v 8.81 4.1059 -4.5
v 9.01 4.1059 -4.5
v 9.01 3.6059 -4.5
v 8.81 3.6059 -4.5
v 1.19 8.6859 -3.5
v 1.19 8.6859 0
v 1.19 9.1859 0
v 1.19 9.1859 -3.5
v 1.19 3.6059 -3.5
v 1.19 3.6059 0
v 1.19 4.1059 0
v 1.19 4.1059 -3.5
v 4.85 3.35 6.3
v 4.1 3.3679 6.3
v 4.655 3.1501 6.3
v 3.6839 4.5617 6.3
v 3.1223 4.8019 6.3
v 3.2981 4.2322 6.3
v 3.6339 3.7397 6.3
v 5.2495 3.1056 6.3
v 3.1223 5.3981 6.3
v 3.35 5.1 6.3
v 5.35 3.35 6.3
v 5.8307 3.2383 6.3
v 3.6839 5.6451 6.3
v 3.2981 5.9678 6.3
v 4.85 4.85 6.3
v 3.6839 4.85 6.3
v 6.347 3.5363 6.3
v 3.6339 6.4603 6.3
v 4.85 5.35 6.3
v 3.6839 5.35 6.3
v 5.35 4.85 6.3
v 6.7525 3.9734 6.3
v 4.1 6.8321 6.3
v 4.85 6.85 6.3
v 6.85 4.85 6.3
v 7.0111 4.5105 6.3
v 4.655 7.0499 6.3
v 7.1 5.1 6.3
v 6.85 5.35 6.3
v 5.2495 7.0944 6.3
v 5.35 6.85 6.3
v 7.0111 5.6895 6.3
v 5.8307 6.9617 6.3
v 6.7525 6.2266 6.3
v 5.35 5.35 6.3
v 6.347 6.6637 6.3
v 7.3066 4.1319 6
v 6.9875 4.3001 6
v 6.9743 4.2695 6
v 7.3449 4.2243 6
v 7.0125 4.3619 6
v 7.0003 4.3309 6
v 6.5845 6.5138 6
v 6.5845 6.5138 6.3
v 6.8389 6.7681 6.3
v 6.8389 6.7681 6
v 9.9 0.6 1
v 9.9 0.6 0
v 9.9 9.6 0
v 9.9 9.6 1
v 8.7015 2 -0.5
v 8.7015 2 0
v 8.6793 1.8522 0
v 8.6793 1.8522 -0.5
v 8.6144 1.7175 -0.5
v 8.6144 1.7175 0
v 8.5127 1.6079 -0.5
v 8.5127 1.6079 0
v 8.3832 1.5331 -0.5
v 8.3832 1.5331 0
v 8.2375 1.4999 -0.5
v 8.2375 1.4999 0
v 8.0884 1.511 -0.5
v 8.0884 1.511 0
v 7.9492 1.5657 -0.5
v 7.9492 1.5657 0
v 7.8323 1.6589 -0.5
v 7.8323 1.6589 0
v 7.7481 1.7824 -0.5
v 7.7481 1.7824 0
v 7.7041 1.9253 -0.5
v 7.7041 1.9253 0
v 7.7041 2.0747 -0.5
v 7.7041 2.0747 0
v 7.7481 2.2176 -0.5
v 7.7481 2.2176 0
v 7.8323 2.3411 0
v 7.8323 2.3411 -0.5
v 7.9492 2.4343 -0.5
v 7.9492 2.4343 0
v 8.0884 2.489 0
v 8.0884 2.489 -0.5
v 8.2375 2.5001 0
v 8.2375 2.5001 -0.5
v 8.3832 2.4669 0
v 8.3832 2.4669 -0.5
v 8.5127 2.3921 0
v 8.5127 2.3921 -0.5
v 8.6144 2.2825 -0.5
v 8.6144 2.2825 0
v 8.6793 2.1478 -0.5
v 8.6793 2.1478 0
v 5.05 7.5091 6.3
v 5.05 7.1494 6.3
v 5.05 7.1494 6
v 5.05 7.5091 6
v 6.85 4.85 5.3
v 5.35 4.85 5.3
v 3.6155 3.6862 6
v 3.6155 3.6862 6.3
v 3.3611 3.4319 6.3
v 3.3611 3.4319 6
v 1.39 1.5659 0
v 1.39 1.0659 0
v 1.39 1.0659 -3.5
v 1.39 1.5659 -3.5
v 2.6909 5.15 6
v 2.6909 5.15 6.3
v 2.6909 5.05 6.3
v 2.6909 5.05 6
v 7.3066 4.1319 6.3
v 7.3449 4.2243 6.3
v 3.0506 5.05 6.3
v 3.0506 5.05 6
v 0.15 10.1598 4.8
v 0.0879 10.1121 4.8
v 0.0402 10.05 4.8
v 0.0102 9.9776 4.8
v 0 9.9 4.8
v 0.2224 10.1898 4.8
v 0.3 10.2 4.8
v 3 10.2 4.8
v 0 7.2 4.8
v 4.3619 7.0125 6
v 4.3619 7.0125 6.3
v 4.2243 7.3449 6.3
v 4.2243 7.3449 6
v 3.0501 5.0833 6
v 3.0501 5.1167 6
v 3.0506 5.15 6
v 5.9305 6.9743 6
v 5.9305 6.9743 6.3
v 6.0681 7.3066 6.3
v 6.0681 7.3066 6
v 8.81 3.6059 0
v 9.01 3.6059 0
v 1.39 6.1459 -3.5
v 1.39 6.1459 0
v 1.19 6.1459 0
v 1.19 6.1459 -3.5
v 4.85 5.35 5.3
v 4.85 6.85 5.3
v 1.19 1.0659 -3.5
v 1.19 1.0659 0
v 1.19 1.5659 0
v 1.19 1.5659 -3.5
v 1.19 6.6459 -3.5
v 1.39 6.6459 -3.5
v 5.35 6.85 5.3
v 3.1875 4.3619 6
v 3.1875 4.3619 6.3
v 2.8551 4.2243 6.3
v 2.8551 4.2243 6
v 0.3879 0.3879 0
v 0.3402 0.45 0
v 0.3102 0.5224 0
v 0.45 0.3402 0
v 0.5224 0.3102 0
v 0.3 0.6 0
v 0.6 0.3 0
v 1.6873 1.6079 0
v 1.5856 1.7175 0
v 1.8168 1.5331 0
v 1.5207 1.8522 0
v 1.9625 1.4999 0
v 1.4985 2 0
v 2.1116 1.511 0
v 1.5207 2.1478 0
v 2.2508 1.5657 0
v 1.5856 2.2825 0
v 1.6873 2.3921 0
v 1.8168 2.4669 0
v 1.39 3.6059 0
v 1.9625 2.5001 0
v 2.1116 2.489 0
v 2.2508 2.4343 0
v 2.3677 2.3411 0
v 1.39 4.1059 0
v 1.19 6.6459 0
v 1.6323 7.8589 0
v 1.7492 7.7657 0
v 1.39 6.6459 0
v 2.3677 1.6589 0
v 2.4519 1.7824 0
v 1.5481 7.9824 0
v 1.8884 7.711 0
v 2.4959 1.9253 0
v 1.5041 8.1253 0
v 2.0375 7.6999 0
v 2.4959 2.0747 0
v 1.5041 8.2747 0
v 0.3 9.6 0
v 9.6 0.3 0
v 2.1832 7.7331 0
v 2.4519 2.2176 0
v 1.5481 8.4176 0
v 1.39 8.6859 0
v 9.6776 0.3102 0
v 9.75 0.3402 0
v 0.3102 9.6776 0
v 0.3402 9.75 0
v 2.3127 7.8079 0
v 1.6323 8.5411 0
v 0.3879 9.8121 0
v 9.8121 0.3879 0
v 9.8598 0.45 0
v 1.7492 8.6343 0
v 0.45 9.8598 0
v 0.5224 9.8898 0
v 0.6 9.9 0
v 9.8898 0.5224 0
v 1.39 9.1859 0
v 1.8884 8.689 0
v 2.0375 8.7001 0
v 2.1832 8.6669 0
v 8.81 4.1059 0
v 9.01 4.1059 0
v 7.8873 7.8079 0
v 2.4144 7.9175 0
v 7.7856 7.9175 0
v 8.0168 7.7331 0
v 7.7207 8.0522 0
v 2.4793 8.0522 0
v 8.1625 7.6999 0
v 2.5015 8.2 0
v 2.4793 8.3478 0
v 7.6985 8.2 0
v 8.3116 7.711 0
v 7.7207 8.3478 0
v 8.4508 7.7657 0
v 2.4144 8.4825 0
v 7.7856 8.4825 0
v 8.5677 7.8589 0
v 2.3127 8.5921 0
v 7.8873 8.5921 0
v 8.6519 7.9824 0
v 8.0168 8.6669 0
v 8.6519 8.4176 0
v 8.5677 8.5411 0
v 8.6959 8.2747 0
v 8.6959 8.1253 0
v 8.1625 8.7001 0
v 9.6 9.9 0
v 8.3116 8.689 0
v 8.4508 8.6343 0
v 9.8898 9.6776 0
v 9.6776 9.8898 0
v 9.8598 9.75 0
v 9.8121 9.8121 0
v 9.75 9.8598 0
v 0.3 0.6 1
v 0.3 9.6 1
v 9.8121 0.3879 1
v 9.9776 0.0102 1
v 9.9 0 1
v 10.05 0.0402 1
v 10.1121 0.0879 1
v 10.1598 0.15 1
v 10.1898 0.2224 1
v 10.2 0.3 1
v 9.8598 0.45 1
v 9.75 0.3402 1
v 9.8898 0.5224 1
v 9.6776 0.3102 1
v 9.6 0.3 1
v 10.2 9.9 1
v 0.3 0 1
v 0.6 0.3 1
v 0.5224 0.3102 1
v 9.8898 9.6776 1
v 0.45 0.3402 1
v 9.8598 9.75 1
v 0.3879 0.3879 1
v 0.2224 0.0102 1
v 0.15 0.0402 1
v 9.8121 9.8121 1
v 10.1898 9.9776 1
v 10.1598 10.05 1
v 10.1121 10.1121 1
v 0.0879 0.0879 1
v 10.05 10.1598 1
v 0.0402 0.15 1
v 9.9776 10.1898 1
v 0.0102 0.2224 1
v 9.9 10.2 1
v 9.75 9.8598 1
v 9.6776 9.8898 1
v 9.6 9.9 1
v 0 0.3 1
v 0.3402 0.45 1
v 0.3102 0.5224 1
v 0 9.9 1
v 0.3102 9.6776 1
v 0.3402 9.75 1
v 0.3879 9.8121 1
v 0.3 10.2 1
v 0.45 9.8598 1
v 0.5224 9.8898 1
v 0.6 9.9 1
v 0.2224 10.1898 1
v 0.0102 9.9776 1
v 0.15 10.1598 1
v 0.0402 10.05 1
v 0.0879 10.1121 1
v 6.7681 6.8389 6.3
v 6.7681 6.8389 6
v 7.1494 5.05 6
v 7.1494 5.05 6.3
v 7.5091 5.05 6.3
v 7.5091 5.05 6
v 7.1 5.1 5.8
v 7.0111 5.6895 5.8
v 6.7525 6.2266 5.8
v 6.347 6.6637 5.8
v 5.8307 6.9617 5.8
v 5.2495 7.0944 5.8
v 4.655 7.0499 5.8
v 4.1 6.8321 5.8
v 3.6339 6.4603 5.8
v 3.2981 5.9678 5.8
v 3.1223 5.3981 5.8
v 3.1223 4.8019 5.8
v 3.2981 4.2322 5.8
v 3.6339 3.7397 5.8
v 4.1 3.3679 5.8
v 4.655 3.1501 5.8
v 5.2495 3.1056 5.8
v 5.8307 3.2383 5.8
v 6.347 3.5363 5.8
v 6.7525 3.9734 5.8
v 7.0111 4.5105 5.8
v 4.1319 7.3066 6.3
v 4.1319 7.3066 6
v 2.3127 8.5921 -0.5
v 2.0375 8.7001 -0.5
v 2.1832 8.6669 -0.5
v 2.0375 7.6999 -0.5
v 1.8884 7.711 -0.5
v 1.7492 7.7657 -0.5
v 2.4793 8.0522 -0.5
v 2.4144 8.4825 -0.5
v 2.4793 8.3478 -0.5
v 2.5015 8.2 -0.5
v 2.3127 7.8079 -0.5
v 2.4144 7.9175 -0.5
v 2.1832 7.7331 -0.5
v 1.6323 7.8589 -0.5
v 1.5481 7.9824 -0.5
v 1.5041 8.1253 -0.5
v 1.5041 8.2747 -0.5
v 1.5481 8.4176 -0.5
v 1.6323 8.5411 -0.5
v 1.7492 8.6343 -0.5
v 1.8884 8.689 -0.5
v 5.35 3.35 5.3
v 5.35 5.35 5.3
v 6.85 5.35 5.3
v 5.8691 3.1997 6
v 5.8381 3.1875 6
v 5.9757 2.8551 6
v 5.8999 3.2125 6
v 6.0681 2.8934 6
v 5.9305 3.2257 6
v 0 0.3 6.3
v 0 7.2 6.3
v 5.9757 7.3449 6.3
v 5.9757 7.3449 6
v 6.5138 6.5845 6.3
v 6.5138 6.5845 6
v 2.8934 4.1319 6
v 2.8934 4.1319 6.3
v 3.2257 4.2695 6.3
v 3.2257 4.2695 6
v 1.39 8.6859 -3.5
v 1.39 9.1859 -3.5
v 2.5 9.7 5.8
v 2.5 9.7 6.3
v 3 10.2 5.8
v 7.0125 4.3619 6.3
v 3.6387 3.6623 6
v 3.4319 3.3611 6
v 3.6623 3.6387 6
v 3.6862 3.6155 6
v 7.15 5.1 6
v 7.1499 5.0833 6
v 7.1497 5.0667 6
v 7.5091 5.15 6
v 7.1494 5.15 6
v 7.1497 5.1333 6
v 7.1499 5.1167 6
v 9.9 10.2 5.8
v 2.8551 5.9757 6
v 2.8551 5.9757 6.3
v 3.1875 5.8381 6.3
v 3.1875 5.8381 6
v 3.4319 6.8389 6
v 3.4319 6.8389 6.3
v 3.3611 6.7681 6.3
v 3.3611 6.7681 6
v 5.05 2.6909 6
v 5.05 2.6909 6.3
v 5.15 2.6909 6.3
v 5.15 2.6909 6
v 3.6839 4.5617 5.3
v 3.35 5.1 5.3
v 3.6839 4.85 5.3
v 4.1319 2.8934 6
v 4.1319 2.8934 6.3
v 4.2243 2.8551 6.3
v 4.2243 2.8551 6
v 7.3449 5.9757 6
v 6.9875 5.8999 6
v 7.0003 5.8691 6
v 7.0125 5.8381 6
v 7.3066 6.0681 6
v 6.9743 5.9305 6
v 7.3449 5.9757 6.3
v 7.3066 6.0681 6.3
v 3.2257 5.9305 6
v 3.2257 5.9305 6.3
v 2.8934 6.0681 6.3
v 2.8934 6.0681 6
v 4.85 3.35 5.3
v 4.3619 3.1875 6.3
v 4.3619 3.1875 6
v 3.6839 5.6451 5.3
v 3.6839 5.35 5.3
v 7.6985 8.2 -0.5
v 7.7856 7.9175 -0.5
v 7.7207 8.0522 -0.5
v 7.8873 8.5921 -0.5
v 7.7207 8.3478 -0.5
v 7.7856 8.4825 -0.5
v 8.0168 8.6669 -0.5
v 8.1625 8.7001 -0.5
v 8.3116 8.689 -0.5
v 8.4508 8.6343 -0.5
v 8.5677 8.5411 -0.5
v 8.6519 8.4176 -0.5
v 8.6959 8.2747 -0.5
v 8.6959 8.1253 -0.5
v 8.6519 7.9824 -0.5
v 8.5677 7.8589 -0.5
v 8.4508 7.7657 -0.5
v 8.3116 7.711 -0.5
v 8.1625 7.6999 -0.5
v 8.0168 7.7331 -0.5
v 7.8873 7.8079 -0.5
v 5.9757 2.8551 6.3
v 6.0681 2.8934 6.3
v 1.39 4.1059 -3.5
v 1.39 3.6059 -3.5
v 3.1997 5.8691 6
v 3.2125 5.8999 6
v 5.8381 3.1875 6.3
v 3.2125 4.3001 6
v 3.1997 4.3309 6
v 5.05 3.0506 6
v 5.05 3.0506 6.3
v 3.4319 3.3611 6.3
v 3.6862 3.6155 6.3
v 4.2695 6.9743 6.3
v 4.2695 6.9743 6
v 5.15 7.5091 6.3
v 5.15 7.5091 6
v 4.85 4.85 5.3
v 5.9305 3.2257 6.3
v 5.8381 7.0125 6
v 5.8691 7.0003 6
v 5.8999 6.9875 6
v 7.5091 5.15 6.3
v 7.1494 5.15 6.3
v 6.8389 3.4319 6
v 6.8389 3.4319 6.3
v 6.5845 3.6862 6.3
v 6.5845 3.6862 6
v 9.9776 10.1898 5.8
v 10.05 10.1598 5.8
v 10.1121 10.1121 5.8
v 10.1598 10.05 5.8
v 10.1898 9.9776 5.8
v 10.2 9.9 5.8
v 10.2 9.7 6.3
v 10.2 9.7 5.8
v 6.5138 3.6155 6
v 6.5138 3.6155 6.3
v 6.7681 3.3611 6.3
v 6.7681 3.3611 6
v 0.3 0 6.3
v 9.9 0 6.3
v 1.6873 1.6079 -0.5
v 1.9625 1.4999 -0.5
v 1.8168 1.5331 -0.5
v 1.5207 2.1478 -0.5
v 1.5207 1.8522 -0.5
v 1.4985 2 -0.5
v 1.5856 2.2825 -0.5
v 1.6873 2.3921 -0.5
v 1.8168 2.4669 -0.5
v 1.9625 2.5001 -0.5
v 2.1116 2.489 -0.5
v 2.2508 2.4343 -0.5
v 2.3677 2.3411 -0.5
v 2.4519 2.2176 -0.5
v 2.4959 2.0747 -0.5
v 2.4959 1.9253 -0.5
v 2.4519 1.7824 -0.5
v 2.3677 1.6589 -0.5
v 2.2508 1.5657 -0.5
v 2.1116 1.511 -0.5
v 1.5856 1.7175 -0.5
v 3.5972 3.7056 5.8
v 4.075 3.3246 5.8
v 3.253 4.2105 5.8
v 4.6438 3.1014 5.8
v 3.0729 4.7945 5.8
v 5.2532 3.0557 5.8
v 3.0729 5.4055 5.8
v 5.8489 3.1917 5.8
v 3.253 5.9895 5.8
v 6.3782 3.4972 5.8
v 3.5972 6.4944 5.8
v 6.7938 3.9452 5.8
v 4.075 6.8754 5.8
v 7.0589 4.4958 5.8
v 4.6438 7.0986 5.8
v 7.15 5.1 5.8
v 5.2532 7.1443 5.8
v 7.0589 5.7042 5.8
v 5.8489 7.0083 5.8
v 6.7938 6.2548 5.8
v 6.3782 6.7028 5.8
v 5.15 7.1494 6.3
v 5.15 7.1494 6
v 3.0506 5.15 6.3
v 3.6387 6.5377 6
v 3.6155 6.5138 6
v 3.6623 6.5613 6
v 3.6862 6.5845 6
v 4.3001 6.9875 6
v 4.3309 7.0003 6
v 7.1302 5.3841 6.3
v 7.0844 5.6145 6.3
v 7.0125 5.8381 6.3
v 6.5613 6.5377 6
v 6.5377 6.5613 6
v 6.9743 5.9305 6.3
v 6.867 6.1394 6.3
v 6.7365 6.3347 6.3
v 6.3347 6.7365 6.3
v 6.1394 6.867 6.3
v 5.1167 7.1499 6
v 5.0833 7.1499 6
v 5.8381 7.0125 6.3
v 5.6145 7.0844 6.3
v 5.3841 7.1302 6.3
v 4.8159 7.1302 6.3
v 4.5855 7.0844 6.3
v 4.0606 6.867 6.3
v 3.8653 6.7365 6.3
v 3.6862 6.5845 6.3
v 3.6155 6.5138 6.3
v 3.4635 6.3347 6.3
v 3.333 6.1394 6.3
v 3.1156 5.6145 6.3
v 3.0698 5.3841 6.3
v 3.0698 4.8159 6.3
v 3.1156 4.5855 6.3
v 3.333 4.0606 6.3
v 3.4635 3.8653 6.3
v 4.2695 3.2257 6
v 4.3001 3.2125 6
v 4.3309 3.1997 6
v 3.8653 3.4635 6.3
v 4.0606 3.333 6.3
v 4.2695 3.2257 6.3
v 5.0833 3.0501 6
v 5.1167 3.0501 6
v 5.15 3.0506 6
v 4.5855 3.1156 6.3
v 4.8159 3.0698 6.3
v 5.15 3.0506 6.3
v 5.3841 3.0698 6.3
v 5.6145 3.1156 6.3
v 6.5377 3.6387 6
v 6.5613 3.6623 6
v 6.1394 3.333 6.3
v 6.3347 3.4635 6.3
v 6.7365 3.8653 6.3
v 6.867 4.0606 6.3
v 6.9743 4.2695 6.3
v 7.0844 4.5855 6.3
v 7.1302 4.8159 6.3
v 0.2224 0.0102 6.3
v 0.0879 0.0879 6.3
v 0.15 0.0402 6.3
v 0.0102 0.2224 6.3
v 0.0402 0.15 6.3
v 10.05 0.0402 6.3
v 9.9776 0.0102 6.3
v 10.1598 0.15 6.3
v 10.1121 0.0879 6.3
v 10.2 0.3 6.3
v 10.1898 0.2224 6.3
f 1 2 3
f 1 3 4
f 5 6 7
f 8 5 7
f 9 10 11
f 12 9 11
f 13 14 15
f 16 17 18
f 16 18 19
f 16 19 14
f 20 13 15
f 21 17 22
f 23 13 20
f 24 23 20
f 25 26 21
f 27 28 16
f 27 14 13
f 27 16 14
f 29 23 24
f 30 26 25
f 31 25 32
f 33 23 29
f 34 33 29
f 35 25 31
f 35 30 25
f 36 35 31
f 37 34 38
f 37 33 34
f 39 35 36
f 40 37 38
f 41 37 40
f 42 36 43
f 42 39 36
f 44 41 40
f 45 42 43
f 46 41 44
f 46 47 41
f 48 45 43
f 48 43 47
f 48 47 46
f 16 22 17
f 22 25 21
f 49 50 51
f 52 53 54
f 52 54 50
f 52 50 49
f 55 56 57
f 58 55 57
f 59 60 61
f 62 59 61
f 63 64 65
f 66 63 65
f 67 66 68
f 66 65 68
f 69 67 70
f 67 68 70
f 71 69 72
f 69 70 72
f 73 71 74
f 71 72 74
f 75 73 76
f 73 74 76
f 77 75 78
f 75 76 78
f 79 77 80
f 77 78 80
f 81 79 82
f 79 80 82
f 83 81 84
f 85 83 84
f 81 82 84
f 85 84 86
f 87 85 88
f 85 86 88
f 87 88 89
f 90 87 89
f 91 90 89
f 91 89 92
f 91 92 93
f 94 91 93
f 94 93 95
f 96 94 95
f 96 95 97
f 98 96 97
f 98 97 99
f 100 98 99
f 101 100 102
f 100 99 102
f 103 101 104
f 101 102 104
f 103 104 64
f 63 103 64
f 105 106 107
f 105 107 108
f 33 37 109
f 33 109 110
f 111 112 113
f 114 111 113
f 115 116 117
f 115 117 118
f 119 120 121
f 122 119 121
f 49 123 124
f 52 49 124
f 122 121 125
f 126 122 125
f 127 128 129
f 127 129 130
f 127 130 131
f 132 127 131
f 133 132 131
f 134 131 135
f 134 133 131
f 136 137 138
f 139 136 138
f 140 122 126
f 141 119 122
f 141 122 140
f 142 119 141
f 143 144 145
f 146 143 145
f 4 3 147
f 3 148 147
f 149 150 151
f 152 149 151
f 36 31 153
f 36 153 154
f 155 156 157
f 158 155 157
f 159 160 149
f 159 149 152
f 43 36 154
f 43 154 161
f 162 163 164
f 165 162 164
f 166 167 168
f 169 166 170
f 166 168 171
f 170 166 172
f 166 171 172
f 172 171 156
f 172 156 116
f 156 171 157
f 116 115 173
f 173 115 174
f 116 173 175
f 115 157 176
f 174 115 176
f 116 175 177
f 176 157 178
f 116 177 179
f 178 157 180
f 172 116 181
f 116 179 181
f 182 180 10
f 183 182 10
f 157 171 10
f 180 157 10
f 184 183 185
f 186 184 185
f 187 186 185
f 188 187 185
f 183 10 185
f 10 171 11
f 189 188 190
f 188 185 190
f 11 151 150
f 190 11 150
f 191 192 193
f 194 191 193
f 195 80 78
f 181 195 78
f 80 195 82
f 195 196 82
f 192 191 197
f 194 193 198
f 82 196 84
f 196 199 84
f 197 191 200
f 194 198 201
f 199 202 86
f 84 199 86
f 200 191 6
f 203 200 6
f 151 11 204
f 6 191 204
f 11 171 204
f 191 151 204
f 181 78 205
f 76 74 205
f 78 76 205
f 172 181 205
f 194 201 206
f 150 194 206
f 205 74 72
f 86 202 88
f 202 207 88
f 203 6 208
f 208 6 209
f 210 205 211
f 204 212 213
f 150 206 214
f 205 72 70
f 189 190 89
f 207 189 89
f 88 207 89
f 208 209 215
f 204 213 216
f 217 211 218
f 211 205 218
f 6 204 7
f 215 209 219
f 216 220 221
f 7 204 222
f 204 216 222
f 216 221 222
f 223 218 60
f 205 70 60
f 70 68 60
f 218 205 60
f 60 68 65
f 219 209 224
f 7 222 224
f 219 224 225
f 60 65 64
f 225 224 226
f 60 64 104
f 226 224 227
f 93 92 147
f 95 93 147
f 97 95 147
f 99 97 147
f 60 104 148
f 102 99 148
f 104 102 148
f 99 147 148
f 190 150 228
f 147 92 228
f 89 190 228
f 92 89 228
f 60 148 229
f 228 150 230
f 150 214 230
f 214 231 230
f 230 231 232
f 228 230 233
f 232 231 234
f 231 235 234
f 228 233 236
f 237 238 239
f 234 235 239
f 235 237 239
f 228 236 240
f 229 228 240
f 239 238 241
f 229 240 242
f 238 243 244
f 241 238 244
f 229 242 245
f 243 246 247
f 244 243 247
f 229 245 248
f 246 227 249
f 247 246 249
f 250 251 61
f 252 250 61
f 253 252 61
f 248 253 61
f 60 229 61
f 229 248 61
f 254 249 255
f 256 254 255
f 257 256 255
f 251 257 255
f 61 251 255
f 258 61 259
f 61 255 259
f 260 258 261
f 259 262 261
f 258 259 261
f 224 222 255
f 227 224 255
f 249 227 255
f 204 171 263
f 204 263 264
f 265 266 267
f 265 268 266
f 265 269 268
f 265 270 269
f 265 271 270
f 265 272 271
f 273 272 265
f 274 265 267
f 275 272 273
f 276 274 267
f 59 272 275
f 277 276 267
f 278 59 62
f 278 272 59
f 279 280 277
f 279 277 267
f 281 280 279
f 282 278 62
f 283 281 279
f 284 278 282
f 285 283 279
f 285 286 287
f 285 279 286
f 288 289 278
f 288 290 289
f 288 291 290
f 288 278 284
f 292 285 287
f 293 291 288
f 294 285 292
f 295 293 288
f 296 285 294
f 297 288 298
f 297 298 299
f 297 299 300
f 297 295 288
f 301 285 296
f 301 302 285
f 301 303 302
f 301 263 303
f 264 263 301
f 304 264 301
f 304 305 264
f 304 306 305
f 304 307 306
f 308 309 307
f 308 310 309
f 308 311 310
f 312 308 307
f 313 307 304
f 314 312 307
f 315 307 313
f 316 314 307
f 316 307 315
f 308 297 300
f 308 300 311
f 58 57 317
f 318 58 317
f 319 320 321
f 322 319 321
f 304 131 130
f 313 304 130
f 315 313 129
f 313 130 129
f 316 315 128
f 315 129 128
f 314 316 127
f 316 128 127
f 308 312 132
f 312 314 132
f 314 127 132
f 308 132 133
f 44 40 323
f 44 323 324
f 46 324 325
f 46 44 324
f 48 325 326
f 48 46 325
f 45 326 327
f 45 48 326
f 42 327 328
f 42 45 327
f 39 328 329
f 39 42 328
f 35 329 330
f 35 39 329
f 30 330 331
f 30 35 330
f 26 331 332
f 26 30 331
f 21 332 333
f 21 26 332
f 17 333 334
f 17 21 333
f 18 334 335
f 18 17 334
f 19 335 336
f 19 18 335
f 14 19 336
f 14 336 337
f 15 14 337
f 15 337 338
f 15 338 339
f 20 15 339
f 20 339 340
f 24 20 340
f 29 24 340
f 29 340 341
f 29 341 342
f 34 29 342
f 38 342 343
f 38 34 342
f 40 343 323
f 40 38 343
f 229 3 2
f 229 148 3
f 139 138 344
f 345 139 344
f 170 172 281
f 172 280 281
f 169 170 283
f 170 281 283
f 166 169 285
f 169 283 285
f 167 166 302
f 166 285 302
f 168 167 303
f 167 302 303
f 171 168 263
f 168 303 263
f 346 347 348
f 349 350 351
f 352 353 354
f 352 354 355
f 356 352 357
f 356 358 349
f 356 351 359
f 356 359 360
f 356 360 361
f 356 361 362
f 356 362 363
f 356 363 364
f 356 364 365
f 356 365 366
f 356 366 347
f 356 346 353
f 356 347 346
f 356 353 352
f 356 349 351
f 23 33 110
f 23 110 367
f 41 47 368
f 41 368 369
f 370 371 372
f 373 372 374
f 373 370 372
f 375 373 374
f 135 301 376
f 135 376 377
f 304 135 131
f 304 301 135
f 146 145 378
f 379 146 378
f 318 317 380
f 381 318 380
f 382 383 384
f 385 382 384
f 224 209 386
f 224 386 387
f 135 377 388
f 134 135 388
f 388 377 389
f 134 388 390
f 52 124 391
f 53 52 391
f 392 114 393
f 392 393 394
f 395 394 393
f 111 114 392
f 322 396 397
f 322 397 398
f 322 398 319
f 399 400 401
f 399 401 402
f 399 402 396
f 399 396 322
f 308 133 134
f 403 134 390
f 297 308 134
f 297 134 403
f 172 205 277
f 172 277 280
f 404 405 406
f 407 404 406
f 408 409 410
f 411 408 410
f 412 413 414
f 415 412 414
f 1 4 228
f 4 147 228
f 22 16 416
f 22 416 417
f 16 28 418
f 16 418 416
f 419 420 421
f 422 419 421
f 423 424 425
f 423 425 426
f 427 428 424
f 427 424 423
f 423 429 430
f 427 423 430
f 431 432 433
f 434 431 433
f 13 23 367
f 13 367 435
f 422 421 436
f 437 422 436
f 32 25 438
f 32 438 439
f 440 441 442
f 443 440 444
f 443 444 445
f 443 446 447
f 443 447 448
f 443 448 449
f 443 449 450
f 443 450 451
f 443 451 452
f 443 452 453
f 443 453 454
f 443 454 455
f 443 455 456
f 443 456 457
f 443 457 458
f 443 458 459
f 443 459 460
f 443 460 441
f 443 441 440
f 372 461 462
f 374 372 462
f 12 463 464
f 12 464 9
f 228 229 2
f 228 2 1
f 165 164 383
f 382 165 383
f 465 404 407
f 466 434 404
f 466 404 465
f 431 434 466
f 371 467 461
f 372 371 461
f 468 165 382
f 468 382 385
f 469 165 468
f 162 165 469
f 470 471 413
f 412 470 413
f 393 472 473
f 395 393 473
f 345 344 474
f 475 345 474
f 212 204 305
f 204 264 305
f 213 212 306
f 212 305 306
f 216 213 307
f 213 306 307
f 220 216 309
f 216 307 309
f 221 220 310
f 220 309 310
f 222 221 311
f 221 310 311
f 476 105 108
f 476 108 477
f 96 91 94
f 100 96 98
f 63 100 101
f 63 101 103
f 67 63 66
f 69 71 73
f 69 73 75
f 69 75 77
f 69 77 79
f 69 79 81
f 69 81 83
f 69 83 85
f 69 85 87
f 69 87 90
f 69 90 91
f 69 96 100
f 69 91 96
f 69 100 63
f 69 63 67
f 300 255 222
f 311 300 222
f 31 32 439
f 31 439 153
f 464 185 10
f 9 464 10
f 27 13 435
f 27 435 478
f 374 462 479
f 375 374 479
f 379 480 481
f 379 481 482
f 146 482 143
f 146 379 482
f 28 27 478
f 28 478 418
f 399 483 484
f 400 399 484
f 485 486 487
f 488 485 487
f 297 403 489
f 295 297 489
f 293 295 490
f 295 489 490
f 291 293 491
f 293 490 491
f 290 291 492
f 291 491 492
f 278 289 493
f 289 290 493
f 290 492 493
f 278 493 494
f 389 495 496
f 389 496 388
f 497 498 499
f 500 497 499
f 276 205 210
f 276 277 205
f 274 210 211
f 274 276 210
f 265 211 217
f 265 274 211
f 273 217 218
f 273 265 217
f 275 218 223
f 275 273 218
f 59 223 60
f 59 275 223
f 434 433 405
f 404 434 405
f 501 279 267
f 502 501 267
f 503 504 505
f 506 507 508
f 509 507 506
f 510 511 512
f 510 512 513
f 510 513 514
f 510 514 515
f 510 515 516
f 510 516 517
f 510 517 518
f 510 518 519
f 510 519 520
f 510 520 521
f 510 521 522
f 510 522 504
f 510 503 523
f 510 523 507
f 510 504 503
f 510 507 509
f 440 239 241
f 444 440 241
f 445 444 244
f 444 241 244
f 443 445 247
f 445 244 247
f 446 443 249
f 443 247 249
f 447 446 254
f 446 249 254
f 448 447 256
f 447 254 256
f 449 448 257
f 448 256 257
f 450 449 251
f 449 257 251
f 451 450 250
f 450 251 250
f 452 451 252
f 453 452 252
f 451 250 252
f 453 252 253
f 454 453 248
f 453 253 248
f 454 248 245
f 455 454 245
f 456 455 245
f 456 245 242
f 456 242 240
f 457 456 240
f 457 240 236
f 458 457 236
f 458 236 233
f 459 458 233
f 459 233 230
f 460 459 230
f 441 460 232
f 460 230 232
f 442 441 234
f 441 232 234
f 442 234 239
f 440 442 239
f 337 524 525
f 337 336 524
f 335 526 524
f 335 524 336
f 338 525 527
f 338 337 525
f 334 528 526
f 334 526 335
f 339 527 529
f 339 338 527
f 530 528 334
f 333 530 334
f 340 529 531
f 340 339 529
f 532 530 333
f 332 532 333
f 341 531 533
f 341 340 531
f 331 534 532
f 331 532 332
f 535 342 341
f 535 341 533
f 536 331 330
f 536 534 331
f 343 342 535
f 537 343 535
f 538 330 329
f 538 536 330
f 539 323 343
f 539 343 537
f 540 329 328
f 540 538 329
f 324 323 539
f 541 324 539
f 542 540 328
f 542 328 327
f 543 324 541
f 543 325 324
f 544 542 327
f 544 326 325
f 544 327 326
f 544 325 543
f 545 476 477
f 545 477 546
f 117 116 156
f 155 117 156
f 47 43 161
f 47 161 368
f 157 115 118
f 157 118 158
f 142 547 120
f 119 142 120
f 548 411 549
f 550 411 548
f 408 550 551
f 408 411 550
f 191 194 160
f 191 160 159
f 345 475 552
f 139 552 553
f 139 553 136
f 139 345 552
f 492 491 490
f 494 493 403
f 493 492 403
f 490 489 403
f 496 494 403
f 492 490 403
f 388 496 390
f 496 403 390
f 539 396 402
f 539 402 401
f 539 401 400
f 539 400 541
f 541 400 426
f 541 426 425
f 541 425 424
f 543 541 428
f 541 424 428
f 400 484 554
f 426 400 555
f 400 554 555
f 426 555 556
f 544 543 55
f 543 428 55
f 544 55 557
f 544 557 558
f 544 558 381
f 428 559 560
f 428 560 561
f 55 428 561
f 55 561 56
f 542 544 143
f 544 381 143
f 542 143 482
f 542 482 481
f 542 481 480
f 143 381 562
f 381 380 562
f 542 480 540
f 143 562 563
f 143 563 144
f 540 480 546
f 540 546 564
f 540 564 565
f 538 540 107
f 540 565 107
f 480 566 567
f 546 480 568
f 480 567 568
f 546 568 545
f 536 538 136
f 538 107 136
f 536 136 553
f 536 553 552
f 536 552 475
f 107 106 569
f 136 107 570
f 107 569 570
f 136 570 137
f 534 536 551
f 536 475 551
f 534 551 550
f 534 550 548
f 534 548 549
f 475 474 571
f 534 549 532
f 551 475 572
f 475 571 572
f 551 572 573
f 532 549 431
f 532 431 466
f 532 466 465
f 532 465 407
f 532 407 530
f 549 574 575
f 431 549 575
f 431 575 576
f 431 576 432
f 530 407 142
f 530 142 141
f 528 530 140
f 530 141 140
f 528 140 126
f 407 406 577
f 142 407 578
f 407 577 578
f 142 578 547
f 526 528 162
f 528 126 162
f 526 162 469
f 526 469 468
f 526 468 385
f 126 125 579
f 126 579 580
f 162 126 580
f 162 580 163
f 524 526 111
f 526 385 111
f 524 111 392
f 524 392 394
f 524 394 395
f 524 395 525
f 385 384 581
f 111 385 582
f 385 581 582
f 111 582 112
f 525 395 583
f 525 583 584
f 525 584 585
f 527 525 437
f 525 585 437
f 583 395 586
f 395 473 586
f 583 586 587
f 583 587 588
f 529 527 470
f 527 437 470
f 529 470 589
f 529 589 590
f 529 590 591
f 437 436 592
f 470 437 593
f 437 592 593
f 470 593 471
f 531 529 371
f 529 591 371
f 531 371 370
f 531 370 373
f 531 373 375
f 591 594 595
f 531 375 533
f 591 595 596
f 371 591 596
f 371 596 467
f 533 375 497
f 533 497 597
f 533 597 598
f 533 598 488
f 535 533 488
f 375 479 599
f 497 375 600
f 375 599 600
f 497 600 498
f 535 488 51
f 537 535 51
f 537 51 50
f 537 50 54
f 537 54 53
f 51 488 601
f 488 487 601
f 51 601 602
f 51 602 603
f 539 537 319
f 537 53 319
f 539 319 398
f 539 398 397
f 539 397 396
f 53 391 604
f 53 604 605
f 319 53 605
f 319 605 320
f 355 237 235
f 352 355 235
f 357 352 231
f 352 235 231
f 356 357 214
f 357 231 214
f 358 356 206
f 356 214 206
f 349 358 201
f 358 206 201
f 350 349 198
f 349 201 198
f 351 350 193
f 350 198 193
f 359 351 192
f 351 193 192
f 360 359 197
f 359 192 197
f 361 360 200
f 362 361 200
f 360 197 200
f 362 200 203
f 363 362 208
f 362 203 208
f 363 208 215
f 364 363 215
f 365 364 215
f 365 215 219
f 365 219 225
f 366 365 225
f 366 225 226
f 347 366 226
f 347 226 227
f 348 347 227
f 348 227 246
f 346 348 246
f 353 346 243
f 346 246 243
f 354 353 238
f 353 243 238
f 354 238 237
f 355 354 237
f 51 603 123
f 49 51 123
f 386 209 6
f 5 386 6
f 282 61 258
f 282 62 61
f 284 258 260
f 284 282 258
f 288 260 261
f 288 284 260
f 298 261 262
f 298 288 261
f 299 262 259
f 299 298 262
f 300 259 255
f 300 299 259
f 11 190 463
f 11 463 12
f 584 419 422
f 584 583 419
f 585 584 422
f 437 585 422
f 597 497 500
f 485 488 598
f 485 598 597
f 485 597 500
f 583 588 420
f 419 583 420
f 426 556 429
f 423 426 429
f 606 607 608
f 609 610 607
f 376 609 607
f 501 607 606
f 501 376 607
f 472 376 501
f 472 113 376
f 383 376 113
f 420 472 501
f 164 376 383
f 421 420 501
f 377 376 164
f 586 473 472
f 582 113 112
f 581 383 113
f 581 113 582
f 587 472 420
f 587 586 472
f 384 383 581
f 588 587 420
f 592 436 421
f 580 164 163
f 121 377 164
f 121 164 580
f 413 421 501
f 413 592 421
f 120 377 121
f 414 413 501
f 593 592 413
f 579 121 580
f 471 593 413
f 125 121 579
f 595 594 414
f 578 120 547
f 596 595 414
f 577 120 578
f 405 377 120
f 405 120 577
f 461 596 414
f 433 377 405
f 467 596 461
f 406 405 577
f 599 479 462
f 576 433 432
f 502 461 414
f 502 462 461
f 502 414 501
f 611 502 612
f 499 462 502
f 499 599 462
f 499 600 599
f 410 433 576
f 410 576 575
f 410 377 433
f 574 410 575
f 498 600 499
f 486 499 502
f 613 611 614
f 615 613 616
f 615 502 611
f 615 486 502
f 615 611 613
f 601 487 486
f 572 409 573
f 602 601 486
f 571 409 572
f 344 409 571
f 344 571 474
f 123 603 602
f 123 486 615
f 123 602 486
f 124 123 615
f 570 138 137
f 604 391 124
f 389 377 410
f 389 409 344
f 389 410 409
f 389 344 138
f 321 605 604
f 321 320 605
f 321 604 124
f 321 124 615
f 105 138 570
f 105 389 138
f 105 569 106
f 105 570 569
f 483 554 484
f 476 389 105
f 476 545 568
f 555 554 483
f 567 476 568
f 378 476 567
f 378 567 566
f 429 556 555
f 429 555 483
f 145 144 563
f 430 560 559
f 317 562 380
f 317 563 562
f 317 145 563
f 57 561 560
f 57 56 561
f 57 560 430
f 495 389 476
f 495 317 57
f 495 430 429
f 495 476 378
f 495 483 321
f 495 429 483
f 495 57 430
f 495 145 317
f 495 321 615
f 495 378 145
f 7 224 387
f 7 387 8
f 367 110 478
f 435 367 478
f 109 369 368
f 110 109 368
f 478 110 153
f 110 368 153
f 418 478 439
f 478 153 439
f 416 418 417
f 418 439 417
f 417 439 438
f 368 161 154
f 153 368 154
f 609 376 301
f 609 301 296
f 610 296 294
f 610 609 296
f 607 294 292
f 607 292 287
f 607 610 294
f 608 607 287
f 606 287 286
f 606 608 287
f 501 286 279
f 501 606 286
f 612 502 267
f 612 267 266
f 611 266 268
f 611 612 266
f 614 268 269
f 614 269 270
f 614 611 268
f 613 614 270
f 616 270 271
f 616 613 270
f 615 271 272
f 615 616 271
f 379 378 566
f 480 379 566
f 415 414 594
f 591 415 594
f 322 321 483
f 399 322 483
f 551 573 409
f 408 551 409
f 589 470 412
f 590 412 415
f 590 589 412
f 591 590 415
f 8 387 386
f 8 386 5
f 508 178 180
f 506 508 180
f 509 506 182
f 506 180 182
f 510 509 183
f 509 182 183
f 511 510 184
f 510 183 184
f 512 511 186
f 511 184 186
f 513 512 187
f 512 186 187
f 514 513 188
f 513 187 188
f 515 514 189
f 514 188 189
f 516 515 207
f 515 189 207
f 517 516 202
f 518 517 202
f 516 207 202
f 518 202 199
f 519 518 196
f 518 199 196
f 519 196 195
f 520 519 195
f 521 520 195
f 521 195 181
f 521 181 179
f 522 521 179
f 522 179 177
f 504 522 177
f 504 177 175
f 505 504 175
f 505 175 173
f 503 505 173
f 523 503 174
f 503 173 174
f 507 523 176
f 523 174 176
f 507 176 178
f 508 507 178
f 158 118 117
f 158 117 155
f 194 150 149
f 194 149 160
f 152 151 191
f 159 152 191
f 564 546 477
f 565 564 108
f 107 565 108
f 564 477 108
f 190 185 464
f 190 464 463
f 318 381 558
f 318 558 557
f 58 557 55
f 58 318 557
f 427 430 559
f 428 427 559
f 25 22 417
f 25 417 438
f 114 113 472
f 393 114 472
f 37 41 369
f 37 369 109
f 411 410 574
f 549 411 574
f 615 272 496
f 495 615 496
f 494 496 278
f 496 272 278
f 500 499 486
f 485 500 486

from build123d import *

# Parameters (mm, degrees)
SKETCH1_W               = 10.2
SKETCH1_H               = 10.2
BOSS_EXTRUDE2_DEPTH     = 6.5
SKETCH3_R               = 0.501534086
BOSS_EXTRUDE3_DEPTH     = 0.5
FILLET1_R               = 0.3
SKETCH4_W               = 10.2
SKETCH4_H               = 10.2
SKETCH4_W_2             = 9.6
SKETCH4_H_2             = 9.6
CUT_EXTRUDE_THIN1_DEPTH = 1
FILLET2_R               = 0.3
SKETCH5_W               = 0.2
SKETCH5_H               = 0.5
BOSS_EXTRUDE5_DEPTH     = 3.5
SKETCH6_W               = 0.2
SKETCH6_H               = 0.5
BOSS_EXTRUDE6_DEPTH     = 1
SKETCH7_W               = 10.2
SKETCH7_H               = 10.2
CUT_EXTRUDE3_DEPTH      = 0.2
CUT_EXTRUDE4_DEPTH      = 1.5
CUT_EXTRUDE5_DEPTH      = 0.5
SKETCH10_R              = 2.05
SKETCH10_R_2            = 2
CUT_EXTRUDE6_DEPTH      = 0.5
CUT_EXTRUDE7_DEPTH      = 1
CUT_EXTRUDE8_DEPTH      = 0.3


with BuildPart() as part:
    # Sketch1 → Boss-Extrude2 (new body)
    with BuildSketch(Plane.XY):
        with Locations((5.1, 5.1)):
            Rectangle(SKETCH1_W, SKETCH1_H)
    extrude(amount=BOSS_EXTRUDE2_DEPTH)

    # Sketch3 → Boss-Extrude3 (add)
    with BuildSketch(Plane(origin=(0, 0, 0), x_dir=(-1, 0, 0), z_dir=(0, 0, -1))):
        with Locations((-8.2, 8.2)):
            Circle(SKETCH3_R)
        with Locations(Location((-2, 8.2, 0), (0, 0, 180))):
            Circle(SKETCH3_R)
        with Locations(Location((-8.2, 2, 0), (0, 0, 180))):
            Circle(SKETCH3_R)
        with Locations((-2, 2)):
            Circle(SKETCH3_R)
    extrude(amount=BOSS_EXTRUDE3_DEPTH)

    # Fillet1
    fillet1_edges = [part.edges().sort_by_distance(p)[0] for p in [
        (0, 10.2, 3.25),
        (10.2, 10.2, 3.25),
        (10.2, 0, 3.25),
        (0, 0, 3.25),
    ]]
    fillet(fillet1_edges, radius=FILLET1_R)

    # Sketch4 → Cut-Extrude-Thin1 (cut)
    with BuildSketch(Plane(origin=(0, 0, 0), x_dir=(-1, 0, 0), z_dir=(0, 0, -1))):
        with Locations((-5.1, 5.1)):
            Rectangle(SKETCH4_W, SKETCH4_H)
        with Locations((-5.1, 5.1)):
            Rectangle(SKETCH4_W_2, SKETCH4_H_2, mode=Mode.SUBTRACT)
    extrude(amount=-CUT_EXTRUDE_THIN1_DEPTH, mode=Mode.SUBTRACT)

    # Fillet2
    fillet2_edges = [part.edges().sort_by_distance(p)[0] for p in [
        (9.9, 0.3, 0.5),
        (9.9, 9.9, 0.5),
        (0.3, 9.9, 0.5),
        (0.3, 0.3, 0.5),
    ]]
    fillet(fillet2_edges, radius=FILLET2_R)

    # Sketch5 → Boss-Extrude5 (add)
    with BuildSketch(Plane(origin=(0, 0, 0), x_dir=(-1, 0, 0), z_dir=(0, 0, -1))):
        with Locations((-1.29, 8.935868973)):
            Rectangle(SKETCH5_W, SKETCH5_H)
        with Locations((-1.29, 6.395868973)):
            Rectangle(SKETCH5_W, SKETCH5_H)
        with Locations((-1.29, 3.855868973)):
            Rectangle(SKETCH5_W, SKETCH5_H)
        with Locations((-1.29, 1.315868973)):
            Rectangle(SKETCH5_W, SKETCH5_H)
        with Locations((-8.91, 3.855868973)):
            Rectangle(SKETCH5_W, SKETCH5_H)
    extrude(amount=BOSS_EXTRUDE5_DEPTH)

    # Sketch6 → Boss-Extrude6 (add)
    with BuildSketch(Plane(origin=(0, 0, -3.5), x_dir=(-1, 0, 0), z_dir=(0, 0, -1))):
        with Locations((-8.91, 3.855868973)):
            Rectangle(SKETCH6_W, SKETCH6_H)
    extrude(amount=BOSS_EXTRUDE6_DEPTH)

    # Sketch7 → Cut-Extrude3 (cut)
    with BuildSketch(Plane.XY.offset(6.5)):
        with Locations((5.1, 5.1)):
            Rectangle(SKETCH7_W, SKETCH7_H)
    extrude(amount=-CUT_EXTRUDE3_DEPTH, mode=Mode.SUBTRACT)

    # Sketch8 → Cut-Extrude4 (cut)
    with BuildSketch(Plane.XY.offset(6.3)):
        Polygon((0, 10.2), (0, 7.2), (3, 10.2), align=None)
    extrude(amount=-CUT_EXTRUDE4_DEPTH, mode=Mode.SUBTRACT)

    # Sketch9 → Cut-Extrude5 (cut)
    with BuildSketch(Plane.XY.offset(6.3)):
        Polygon((3, 10.2), (10.2, 10.2), (10.2, 9.7), (2.5, 9.7), align=None)
    extrude(amount=-CUT_EXTRUDE5_DEPTH, mode=Mode.SUBTRACT)

    # Sketch10 → Cut-Extrude6 (cut)
    with BuildSketch(Plane.XY.offset(6.3)):
        with Locations((5.1, 5.1)):
            Circle(SKETCH10_R)
        with Locations((5.1, 5.1)):
            Circle(SKETCH10_R_2, mode=Mode.SUBTRACT)
    extrude(amount=-CUT_EXTRUDE6_DEPTH, mode=Mode.SUBTRACT)

    # Sketch11 → Cut-Extrude7 (cut)
    with BuildSketch(Plane.XY.offset(6.3)):
        Polygon((5.35, 6.85), (5.35, 5.35), (6.85, 5.35), (6.85, 4.85), (5.35, 4.85), (5.35, 3.35), (4.85, 3.35), (4.85, 4.85), (3.683893811, 4.85), (3.683893811, 4.56171007), (3.35, 5.1), (3.683893811, 5.645083537), (3.683893811, 5.35), (4.85, 5.35), (4.85, 6.85), align=None)
    extrude(amount=-CUT_EXTRUDE7_DEPTH, mode=Mode.SUBTRACT)

    # Sketch12 → Cut-Extrude8 (cut)
    with BuildSketch(Plane.XY.offset(6.3)):
        with BuildLine():
            Line((5.05, 7.509113019), (5.15, 7.509113019))
            Line((5.15, 7.509113019), (5.15, 7.149390153))
            ThreePointArc((5.15, 7.149390153), (5.1, 7.15), (5.05, 7.149390153))
            Line((5.05, 7.149390153), (5.05, 7.509113019))
        make_face()
        with BuildLine():
            Line((4.224266338, 7.344864381), (4.131878384, 7.306596038))
            Line((4.131878384, 7.306596038), (4.269538365, 6.974255445))
            ThreePointArc((4.269538365, 6.974255445), (4.315498964, 6.993953042), (4.361926319, 7.012523788))
            Line((4.361926319, 7.012523788), (4.224266338, 7.344864381))
        make_face()
        with BuildLine():
            Line((2.855135619, 5.975733662), (3.187476212, 5.838073681))
            ThreePointArc((3.187476212, 5.838073681), (3.206046958, 5.884501036), (3.225744555, 5.930461635))
            Line((3.225744555, 5.930461635), (2.893403962, 6.068121616))
            Line((2.893403962, 6.068121616), (2.855135619, 5.975733662))
        make_face()
        with BuildLine():
            Line((2.690886981, 5.15), (2.690886981, 5.05))
            Line((2.690886981, 5.05), (3.050609847, 5.05))
            ThreePointArc((3.050609847, 5.05), (3.05, 5.1), (3.050609847, 5.15))
            Line((3.050609847, 5.15), (2.690886981, 5.15))
        make_face()
        with BuildLine():
            Line((3.431855187, 6.838855491), (3.361144509, 6.768144813))
            Line((3.361144509, 6.768144813), (3.615506986, 6.513782336))
            ThreePointArc((3.615506986, 6.513782336), (3.650431099, 6.549568901), (3.686217664, 6.584493014))
            Line((3.686217664, 6.584493014), (3.431855187, 6.838855491))
        make_face()
        with BuildLine():
            Line((3.431855187, 3.361144509), (3.686217664, 3.615506986))
            ThreePointArc((3.686217664, 3.615506986), (3.650431099, 3.650431099), (3.615506986, 3.686217664))
            Line((3.615506986, 3.686217664), (3.361144509, 3.431855187))
            Line((3.361144509, 3.431855187), (3.431855187, 3.361144509))
        make_face()
        with BuildLine():
            Line((4.131878384, 2.893403962), (4.224266338, 2.855135619))
            Line((4.224266338, 2.855135619), (4.361926319, 3.187476212))
            ThreePointArc((4.361926319, 3.187476212), (4.315498964, 3.206046958), (4.269538365, 3.225744555))
            Line((4.269538365, 3.225744555), (4.131878384, 2.893403962))
        make_face()
        with BuildLine():
            Line((5.15, 2.690886981), (5.15, 3.050609847))
            ThreePointArc((5.15, 3.050609847), (5.1, 3.05), (5.05, 3.050609847))
            Line((5.05, 3.050609847), (5.05, 2.690886981))
            Line((5.05, 2.690886981), (5.15, 2.690886981))
        make_face()
        with BuildLine():
            Line((6.068121616, 2.893403962), (5.930461635, 3.225744555))
            ThreePointArc((5.930461635, 3.225744555), (5.884501036, 3.206046958), (5.838073681, 3.187476212))
            Line((5.838073681, 3.187476212), (5.975733662, 2.855135619))
            Line((5.975733662, 2.855135619), (6.068121616, 2.893403962))
        make_face()
        with BuildLine():
            Line((6.768144813, 3.361144509), (6.838855491, 3.431855187))
            Line((6.838855491, 3.431855187), (6.584493014, 3.686217664))
            ThreePointArc((6.584493014, 3.686217664), (6.549568901, 3.650431099), (6.513782336, 3.615506986))
            Line((6.513782336, 3.615506986), (6.768144813, 3.361144509))
        make_face()
        with BuildLine():
            Line((2.855135619, 4.224266338), (2.893403962, 4.131878384))
            Line((2.893403962, 4.131878384), (3.225744555, 4.269538365))
            ThreePointArc((3.225744555, 4.269538365), (3.206046958, 4.315498964), (3.187476212, 4.361926319))
            Line((3.187476212, 4.361926319), (2.855135619, 4.224266338))
        make_face()
        with BuildLine():
            Line((7.344864381, 4.224266338), (7.012523788, 4.361926319))
            ThreePointArc((7.012523788, 4.361926319), (6.993953042, 4.315498964), (6.974255445, 4.269538365))
            Line((6.974255445, 4.269538365), (7.306596038, 4.131878384))
            Line((7.306596038, 4.131878384), (7.344864381, 4.224266338))
        make_face()
        with BuildLine():
            Line((7.509113019, 5.15), (7.149390153, 5.15))
            ThreePointArc((7.149390153, 5.15), (7.15, 5.1), (7.149390153, 5.05))
            Line((7.149390153, 5.05), (7.509113019, 5.05))
            Line((7.509113019, 5.05), (7.509113019, 5.15))
        make_face()
        with BuildLine():
            Line((7.344864381, 5.975733662), (7.306596038, 6.068121616))
            Line((7.306596038, 6.068121616), (6.974255445, 5.930461635))
            ThreePointArc((6.974255445, 5.930461635), (6.993953042, 5.884501036), (7.012523788, 5.838073681))
            Line((7.012523788, 5.838073681), (7.344864381, 5.975733662))
        make_face()
        with BuildLine():
            Line((6.768144813, 6.838855491), (6.513782336, 6.584493014))
            ThreePointArc((6.513782336, 6.584493014), (6.549568901, 6.549568901), (6.584493014, 6.513782336))
            Line((6.584493014, 6.513782336), (6.838855491, 6.768144813))
            Line((6.838855491, 6.768144813), (6.768144813, 6.838855491))
        make_face()
        with BuildLine():
            Line((5.975733662, 7.344864381), (5.838073681, 7.012523788))
            ThreePointArc((5.838073681, 7.012523788), (5.884501036, 6.993953042), (5.930461635, 6.974255445))
            Line((5.930461635, 6.974255445), (6.068121616, 7.306596038))
            Line((6.068121616, 7.306596038), (5.975733662, 7.344864381))
        make_face()
    extrude(amount=-CUT_EXTRUDE8_DEPTH, mode=Mode.SUBTRACT)


solid = part.part
